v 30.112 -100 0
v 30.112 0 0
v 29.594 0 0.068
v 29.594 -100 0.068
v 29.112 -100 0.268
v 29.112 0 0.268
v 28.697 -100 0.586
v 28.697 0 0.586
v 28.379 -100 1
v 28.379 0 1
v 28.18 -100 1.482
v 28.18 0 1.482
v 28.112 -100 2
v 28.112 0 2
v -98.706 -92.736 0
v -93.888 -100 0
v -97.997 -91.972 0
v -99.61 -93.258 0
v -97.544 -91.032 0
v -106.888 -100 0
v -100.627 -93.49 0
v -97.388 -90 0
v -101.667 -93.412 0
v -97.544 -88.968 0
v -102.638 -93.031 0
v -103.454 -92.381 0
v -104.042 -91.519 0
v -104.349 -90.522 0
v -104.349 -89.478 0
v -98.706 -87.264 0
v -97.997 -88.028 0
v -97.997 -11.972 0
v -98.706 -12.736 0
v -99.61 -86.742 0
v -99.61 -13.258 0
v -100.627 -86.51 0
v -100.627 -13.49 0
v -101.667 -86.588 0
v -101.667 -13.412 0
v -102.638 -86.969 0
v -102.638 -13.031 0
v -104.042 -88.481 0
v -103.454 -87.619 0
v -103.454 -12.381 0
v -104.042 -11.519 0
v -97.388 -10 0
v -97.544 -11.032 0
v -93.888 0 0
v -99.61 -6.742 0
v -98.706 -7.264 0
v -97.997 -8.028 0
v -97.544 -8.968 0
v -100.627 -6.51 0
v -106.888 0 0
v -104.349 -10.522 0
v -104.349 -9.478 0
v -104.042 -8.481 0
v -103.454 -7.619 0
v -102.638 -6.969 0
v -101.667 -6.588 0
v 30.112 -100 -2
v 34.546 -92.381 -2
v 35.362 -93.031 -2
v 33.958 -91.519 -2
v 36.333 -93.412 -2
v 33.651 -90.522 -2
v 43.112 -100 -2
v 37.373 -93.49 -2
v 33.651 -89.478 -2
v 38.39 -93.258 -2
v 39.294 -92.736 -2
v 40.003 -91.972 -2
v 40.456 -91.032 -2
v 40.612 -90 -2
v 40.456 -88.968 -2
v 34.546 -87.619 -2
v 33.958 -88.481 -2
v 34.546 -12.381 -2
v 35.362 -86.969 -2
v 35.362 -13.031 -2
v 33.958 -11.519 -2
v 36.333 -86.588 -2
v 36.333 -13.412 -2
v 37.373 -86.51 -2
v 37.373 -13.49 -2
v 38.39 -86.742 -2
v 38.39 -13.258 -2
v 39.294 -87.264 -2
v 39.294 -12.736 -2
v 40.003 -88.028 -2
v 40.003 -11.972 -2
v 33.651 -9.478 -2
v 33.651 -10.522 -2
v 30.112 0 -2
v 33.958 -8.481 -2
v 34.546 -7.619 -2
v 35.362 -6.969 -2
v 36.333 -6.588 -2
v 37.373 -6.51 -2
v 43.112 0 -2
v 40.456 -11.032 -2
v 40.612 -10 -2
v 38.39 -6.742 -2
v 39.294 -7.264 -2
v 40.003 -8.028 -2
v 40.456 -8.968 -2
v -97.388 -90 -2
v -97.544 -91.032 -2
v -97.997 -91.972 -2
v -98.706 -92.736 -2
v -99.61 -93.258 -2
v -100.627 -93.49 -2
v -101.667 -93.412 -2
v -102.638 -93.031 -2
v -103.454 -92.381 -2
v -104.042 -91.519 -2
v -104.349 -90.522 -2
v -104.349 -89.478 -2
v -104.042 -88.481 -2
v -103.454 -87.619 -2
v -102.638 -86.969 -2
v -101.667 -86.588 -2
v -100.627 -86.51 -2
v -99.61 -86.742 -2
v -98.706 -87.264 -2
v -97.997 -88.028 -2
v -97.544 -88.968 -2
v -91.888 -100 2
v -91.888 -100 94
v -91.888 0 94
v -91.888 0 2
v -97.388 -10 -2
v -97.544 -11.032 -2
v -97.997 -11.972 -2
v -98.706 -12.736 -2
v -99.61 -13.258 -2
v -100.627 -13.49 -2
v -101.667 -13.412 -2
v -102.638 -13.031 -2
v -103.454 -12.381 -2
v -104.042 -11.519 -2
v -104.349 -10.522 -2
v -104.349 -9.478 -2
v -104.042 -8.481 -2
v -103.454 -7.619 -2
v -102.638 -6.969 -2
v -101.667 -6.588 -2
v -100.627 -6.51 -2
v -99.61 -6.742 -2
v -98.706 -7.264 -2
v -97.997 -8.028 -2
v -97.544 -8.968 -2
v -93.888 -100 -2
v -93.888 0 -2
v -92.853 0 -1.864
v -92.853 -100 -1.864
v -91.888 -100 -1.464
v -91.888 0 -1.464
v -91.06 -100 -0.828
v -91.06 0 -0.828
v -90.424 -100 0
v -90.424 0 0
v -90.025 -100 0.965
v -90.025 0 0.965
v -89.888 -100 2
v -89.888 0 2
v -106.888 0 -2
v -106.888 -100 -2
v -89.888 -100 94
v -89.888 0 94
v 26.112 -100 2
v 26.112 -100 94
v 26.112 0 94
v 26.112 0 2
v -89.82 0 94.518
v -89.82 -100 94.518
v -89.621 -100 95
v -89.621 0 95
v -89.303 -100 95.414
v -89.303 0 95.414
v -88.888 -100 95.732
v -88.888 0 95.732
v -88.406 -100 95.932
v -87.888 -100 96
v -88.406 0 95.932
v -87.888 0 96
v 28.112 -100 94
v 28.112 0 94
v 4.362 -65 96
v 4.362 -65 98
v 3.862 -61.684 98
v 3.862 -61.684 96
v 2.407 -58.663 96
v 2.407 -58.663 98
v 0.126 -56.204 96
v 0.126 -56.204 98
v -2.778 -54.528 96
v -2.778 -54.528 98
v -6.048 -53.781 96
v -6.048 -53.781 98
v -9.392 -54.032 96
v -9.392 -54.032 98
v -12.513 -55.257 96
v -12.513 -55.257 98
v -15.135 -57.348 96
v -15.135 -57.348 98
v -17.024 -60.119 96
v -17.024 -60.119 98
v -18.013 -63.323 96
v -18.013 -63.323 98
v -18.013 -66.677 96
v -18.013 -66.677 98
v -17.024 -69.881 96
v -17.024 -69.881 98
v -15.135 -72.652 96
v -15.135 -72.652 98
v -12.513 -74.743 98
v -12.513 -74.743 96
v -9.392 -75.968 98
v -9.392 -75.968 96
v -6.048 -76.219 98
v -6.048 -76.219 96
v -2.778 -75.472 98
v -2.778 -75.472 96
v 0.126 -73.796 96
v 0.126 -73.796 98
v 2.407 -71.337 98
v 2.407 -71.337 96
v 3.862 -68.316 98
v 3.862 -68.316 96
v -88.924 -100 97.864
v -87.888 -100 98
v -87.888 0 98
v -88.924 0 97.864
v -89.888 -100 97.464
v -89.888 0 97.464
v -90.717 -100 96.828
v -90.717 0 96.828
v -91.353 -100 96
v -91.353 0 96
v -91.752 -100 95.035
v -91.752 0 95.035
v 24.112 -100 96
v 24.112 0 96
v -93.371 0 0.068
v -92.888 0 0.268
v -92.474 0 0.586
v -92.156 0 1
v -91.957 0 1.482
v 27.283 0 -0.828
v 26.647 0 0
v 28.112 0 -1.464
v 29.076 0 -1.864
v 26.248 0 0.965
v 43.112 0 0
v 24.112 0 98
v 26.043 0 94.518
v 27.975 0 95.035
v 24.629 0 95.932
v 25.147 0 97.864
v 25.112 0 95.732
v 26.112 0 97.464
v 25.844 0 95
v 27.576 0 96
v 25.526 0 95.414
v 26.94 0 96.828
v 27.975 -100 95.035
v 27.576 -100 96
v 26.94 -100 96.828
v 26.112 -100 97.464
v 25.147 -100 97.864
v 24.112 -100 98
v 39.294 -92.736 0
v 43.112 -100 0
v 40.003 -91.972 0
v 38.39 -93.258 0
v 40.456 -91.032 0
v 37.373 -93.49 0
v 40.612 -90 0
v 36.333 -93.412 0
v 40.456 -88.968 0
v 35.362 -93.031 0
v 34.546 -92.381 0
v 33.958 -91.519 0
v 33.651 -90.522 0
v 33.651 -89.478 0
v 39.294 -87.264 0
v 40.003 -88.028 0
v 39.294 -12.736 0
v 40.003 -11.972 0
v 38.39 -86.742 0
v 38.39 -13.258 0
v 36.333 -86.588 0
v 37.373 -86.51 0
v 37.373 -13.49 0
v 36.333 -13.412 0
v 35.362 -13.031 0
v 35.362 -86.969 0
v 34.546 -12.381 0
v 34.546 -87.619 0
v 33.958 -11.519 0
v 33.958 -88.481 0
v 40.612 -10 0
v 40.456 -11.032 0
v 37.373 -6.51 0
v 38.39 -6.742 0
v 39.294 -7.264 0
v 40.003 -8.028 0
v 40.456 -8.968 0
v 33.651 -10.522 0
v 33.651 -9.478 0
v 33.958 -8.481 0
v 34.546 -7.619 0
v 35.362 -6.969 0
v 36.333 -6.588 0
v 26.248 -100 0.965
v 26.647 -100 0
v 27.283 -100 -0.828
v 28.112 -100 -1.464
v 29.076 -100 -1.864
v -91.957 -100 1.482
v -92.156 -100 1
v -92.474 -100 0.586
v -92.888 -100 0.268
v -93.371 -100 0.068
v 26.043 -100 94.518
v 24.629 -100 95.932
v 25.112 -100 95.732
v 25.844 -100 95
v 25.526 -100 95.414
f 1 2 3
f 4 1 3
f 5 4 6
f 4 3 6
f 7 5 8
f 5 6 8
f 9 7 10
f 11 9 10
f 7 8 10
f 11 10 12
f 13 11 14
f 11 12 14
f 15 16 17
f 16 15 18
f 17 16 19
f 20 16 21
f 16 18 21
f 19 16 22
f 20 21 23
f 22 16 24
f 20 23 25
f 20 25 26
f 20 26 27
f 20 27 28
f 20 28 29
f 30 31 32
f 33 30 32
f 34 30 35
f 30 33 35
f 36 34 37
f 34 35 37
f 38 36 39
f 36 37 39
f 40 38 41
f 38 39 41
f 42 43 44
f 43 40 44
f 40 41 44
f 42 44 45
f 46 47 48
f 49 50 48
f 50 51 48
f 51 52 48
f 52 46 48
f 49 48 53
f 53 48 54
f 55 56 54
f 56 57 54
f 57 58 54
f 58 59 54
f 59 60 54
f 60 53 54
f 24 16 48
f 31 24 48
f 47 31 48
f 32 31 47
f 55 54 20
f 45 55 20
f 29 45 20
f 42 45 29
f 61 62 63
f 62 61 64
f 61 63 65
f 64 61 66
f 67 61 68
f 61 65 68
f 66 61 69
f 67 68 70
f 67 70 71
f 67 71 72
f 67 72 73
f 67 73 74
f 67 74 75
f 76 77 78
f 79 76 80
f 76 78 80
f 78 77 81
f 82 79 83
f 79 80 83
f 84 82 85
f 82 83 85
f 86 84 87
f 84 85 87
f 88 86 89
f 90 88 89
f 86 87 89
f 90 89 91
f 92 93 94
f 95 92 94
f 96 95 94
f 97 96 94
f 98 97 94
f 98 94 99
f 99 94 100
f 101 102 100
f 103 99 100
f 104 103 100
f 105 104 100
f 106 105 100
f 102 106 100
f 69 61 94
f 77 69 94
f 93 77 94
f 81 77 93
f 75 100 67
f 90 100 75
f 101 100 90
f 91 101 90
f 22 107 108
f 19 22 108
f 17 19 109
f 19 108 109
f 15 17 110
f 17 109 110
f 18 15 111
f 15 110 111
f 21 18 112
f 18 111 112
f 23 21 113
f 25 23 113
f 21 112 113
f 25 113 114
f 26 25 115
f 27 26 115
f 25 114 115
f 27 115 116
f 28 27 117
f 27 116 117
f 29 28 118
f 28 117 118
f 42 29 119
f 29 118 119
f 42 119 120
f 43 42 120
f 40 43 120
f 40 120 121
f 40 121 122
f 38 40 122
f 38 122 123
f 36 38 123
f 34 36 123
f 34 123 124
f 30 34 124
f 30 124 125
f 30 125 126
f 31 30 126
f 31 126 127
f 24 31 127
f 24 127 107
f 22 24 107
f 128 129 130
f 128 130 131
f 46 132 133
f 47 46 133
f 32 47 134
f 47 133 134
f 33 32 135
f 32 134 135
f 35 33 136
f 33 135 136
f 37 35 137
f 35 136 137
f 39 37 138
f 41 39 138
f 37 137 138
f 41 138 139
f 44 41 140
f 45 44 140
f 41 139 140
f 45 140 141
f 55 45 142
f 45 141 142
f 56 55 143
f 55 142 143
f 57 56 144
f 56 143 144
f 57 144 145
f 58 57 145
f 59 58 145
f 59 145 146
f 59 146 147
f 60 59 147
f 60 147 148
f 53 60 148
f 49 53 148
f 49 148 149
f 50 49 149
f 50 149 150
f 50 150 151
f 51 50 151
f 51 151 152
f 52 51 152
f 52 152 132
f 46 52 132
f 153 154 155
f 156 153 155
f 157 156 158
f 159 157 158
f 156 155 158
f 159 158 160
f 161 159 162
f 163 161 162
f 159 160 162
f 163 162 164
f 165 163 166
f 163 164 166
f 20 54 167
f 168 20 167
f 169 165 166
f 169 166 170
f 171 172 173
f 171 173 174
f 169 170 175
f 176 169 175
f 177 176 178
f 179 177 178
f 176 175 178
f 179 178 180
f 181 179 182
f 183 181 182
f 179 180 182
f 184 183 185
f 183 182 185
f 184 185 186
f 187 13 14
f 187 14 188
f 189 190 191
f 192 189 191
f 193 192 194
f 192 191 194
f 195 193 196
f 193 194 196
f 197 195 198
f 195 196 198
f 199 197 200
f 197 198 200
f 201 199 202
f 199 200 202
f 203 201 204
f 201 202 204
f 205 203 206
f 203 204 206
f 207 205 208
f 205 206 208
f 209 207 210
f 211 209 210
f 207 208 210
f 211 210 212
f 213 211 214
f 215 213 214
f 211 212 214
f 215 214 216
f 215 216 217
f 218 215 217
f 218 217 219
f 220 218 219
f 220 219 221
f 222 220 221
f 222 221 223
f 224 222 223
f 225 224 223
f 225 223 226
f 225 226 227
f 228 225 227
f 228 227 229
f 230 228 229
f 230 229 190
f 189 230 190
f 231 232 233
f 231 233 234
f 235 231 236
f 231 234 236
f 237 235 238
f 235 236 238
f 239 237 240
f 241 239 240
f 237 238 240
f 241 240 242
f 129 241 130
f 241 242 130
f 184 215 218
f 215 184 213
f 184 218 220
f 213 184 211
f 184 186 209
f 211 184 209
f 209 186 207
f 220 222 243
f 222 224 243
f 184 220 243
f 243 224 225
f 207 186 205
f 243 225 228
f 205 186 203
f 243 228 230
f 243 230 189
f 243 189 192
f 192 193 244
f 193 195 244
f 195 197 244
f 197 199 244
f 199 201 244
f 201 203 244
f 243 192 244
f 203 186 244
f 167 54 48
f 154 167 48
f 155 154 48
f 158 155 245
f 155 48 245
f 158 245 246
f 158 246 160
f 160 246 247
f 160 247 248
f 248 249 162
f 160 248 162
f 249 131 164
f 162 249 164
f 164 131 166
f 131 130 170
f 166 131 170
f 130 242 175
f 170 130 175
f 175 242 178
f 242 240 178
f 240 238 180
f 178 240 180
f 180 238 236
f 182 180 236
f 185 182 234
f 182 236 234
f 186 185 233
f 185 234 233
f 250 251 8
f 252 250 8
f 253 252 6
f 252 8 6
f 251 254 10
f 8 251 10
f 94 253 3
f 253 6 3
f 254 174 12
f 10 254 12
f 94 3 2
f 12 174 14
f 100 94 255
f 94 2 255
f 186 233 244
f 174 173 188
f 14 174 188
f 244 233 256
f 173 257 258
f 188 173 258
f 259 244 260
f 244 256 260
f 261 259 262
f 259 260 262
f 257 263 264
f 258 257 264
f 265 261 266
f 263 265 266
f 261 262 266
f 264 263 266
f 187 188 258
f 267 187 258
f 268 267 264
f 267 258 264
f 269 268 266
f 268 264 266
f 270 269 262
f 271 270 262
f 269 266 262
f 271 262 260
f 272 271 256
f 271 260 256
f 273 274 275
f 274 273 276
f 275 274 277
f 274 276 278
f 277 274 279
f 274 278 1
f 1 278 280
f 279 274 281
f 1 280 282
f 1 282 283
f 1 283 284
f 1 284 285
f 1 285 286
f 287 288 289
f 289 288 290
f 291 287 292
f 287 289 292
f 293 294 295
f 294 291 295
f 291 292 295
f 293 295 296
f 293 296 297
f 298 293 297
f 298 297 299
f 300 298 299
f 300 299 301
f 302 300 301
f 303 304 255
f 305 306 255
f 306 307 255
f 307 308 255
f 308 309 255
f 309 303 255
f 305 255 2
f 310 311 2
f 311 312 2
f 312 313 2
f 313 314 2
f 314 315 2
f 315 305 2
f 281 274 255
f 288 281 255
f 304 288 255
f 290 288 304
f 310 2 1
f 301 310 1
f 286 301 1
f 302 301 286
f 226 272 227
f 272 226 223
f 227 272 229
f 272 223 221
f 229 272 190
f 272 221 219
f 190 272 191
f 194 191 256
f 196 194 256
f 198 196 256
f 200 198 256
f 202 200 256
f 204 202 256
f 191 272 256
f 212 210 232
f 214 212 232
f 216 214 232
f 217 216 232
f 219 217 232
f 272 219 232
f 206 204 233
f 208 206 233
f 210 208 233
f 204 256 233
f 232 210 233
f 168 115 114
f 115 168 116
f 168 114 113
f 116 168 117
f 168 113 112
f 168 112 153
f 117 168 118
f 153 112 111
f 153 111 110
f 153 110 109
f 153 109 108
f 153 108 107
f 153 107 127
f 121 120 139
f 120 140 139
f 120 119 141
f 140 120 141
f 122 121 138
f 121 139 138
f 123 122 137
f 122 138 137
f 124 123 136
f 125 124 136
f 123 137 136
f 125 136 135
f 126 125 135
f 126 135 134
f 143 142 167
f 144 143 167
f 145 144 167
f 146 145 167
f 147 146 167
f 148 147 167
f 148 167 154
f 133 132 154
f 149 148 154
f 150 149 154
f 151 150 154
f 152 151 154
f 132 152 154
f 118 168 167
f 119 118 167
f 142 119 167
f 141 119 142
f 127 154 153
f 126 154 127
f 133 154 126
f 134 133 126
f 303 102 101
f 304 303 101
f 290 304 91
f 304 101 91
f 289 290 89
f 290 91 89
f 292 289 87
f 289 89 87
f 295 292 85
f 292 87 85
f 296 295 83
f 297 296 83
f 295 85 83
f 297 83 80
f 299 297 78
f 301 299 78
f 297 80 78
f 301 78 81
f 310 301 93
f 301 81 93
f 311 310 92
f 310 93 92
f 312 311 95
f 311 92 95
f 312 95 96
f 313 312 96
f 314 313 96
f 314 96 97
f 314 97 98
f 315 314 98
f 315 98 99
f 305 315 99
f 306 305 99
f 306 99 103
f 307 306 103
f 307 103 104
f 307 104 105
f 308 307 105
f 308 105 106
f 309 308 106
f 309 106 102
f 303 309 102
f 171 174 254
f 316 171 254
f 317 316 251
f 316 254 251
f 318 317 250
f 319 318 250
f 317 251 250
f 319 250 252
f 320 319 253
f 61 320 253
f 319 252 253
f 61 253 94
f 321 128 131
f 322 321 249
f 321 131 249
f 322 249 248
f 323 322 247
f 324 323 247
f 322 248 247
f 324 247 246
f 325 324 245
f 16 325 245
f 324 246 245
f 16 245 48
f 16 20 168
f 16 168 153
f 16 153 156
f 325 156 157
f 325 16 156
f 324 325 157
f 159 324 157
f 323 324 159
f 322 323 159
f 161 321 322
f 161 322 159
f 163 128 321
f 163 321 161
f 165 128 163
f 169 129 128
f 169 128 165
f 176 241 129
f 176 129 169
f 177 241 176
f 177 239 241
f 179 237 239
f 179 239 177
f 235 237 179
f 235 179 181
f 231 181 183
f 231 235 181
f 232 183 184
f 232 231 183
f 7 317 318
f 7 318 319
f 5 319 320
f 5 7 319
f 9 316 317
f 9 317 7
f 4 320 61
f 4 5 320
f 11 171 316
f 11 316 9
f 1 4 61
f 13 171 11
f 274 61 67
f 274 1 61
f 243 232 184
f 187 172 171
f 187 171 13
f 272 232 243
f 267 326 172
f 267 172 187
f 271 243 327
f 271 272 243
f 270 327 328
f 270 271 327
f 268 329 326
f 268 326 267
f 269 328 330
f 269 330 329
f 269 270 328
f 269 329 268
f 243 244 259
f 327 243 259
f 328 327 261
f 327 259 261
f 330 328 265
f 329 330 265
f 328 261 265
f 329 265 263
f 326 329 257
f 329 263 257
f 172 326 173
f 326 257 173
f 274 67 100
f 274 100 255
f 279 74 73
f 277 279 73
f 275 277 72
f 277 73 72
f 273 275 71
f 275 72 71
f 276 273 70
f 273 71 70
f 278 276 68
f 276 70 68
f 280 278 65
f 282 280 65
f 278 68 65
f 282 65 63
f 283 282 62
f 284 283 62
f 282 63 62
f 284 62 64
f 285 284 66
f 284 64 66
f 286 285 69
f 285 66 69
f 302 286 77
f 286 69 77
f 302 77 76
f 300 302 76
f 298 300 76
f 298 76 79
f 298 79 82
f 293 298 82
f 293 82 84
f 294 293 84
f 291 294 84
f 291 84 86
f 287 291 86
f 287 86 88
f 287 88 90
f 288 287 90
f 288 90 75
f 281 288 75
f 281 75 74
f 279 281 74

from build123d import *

# Parameters (mm, degrees)
F1_DEPTH = 100
F2_R     = 11.25
F3_DEPTH = 25
F4_R     = 3.5
F5_DEPTH = 25


with BuildPart() as f1:
    # F0 (on Front) → F1 (new body)
    with BuildSketch(Plane.XZ):
        with BuildLine():
            Line((-93.888451, 0), (-106.888451, 0))
            Line((-106.888451, 0), (-106.888451, -2))
            Line((-106.888451, -2), (-93.888451, -2))
            ThreePointArc((-93.888451, -2), (-91.060024, -0.828427), (-89.888451, 2))
            Line((-89.888451, 2), (-89.888451, 94))
            ThreePointArc((-89.888451, 94), (-89.302665, 95.414214), (-87.888451, 96))
            Line((-87.888451, 96), (24.111549, 96))
            ThreePointArc((24.111549, 96), (25.525762, 95.414214), (26.111549, 94))
            Line((26.111549, 94), (26.111549, 2))
            ThreePointArc((26.111549, 2), (27.283121, -0.828427), (30.111549, -2))
            Line((30.111549, -2), (43.111549, -2))
            Line((43.111549, -2), (43.111549, 0))
            Line((43.111549, 0), (30.111549, 0))
            ThreePointArc((30.111549, 0), (28.697335, 0.585786), (28.111549, 2))
            Line((28.111549, 2), (28.111549, 94))
            ThreePointArc((28.111549, 94), (26.939976, 96.828427), (24.111549, 98))
            Line((24.111549, 98), (-87.888451, 98))
            ThreePointArc((-87.888451, 98), (-90.716879, 96.828427), (-91.888451, 94))
            Line((-91.888451, 94), (-91.888451, 2))
            ThreePointArc((-91.888451, 2), (-92.474238, 0.585786), (-93.888451, 0))
        make_face()
    extrude(amount=F1_DEPTH)

    # F2 (on face) → F3 (cut)
    with BuildSketch(Plane.XY.offset(98)):
        with Locations((-6.888451, -65)):
            Circle(F2_R)
    extrude(amount=-F3_DEPTH, mode=Mode.SUBTRACT)

    # F4 (on face) → F5 (cut)
    with BuildSketch(Plane(origin=(0, 0, -2), x_dir=(1, 0, 0), z_dir=(0, 0, -1))):
        with Locations((37.111549, 90)):
            Circle(F4_R)
        with Locations((37.111549, 10)):
            Circle(F4_R)
        with Locations((-100.888451, 10)):
            Circle(F4_R)
        with Locations((-100.888451, 90)):
            Circle(F4_R)
    extrude(amount=-F5_DEPTH, mode=Mode.SUBTRACT)


solid = f1.part
